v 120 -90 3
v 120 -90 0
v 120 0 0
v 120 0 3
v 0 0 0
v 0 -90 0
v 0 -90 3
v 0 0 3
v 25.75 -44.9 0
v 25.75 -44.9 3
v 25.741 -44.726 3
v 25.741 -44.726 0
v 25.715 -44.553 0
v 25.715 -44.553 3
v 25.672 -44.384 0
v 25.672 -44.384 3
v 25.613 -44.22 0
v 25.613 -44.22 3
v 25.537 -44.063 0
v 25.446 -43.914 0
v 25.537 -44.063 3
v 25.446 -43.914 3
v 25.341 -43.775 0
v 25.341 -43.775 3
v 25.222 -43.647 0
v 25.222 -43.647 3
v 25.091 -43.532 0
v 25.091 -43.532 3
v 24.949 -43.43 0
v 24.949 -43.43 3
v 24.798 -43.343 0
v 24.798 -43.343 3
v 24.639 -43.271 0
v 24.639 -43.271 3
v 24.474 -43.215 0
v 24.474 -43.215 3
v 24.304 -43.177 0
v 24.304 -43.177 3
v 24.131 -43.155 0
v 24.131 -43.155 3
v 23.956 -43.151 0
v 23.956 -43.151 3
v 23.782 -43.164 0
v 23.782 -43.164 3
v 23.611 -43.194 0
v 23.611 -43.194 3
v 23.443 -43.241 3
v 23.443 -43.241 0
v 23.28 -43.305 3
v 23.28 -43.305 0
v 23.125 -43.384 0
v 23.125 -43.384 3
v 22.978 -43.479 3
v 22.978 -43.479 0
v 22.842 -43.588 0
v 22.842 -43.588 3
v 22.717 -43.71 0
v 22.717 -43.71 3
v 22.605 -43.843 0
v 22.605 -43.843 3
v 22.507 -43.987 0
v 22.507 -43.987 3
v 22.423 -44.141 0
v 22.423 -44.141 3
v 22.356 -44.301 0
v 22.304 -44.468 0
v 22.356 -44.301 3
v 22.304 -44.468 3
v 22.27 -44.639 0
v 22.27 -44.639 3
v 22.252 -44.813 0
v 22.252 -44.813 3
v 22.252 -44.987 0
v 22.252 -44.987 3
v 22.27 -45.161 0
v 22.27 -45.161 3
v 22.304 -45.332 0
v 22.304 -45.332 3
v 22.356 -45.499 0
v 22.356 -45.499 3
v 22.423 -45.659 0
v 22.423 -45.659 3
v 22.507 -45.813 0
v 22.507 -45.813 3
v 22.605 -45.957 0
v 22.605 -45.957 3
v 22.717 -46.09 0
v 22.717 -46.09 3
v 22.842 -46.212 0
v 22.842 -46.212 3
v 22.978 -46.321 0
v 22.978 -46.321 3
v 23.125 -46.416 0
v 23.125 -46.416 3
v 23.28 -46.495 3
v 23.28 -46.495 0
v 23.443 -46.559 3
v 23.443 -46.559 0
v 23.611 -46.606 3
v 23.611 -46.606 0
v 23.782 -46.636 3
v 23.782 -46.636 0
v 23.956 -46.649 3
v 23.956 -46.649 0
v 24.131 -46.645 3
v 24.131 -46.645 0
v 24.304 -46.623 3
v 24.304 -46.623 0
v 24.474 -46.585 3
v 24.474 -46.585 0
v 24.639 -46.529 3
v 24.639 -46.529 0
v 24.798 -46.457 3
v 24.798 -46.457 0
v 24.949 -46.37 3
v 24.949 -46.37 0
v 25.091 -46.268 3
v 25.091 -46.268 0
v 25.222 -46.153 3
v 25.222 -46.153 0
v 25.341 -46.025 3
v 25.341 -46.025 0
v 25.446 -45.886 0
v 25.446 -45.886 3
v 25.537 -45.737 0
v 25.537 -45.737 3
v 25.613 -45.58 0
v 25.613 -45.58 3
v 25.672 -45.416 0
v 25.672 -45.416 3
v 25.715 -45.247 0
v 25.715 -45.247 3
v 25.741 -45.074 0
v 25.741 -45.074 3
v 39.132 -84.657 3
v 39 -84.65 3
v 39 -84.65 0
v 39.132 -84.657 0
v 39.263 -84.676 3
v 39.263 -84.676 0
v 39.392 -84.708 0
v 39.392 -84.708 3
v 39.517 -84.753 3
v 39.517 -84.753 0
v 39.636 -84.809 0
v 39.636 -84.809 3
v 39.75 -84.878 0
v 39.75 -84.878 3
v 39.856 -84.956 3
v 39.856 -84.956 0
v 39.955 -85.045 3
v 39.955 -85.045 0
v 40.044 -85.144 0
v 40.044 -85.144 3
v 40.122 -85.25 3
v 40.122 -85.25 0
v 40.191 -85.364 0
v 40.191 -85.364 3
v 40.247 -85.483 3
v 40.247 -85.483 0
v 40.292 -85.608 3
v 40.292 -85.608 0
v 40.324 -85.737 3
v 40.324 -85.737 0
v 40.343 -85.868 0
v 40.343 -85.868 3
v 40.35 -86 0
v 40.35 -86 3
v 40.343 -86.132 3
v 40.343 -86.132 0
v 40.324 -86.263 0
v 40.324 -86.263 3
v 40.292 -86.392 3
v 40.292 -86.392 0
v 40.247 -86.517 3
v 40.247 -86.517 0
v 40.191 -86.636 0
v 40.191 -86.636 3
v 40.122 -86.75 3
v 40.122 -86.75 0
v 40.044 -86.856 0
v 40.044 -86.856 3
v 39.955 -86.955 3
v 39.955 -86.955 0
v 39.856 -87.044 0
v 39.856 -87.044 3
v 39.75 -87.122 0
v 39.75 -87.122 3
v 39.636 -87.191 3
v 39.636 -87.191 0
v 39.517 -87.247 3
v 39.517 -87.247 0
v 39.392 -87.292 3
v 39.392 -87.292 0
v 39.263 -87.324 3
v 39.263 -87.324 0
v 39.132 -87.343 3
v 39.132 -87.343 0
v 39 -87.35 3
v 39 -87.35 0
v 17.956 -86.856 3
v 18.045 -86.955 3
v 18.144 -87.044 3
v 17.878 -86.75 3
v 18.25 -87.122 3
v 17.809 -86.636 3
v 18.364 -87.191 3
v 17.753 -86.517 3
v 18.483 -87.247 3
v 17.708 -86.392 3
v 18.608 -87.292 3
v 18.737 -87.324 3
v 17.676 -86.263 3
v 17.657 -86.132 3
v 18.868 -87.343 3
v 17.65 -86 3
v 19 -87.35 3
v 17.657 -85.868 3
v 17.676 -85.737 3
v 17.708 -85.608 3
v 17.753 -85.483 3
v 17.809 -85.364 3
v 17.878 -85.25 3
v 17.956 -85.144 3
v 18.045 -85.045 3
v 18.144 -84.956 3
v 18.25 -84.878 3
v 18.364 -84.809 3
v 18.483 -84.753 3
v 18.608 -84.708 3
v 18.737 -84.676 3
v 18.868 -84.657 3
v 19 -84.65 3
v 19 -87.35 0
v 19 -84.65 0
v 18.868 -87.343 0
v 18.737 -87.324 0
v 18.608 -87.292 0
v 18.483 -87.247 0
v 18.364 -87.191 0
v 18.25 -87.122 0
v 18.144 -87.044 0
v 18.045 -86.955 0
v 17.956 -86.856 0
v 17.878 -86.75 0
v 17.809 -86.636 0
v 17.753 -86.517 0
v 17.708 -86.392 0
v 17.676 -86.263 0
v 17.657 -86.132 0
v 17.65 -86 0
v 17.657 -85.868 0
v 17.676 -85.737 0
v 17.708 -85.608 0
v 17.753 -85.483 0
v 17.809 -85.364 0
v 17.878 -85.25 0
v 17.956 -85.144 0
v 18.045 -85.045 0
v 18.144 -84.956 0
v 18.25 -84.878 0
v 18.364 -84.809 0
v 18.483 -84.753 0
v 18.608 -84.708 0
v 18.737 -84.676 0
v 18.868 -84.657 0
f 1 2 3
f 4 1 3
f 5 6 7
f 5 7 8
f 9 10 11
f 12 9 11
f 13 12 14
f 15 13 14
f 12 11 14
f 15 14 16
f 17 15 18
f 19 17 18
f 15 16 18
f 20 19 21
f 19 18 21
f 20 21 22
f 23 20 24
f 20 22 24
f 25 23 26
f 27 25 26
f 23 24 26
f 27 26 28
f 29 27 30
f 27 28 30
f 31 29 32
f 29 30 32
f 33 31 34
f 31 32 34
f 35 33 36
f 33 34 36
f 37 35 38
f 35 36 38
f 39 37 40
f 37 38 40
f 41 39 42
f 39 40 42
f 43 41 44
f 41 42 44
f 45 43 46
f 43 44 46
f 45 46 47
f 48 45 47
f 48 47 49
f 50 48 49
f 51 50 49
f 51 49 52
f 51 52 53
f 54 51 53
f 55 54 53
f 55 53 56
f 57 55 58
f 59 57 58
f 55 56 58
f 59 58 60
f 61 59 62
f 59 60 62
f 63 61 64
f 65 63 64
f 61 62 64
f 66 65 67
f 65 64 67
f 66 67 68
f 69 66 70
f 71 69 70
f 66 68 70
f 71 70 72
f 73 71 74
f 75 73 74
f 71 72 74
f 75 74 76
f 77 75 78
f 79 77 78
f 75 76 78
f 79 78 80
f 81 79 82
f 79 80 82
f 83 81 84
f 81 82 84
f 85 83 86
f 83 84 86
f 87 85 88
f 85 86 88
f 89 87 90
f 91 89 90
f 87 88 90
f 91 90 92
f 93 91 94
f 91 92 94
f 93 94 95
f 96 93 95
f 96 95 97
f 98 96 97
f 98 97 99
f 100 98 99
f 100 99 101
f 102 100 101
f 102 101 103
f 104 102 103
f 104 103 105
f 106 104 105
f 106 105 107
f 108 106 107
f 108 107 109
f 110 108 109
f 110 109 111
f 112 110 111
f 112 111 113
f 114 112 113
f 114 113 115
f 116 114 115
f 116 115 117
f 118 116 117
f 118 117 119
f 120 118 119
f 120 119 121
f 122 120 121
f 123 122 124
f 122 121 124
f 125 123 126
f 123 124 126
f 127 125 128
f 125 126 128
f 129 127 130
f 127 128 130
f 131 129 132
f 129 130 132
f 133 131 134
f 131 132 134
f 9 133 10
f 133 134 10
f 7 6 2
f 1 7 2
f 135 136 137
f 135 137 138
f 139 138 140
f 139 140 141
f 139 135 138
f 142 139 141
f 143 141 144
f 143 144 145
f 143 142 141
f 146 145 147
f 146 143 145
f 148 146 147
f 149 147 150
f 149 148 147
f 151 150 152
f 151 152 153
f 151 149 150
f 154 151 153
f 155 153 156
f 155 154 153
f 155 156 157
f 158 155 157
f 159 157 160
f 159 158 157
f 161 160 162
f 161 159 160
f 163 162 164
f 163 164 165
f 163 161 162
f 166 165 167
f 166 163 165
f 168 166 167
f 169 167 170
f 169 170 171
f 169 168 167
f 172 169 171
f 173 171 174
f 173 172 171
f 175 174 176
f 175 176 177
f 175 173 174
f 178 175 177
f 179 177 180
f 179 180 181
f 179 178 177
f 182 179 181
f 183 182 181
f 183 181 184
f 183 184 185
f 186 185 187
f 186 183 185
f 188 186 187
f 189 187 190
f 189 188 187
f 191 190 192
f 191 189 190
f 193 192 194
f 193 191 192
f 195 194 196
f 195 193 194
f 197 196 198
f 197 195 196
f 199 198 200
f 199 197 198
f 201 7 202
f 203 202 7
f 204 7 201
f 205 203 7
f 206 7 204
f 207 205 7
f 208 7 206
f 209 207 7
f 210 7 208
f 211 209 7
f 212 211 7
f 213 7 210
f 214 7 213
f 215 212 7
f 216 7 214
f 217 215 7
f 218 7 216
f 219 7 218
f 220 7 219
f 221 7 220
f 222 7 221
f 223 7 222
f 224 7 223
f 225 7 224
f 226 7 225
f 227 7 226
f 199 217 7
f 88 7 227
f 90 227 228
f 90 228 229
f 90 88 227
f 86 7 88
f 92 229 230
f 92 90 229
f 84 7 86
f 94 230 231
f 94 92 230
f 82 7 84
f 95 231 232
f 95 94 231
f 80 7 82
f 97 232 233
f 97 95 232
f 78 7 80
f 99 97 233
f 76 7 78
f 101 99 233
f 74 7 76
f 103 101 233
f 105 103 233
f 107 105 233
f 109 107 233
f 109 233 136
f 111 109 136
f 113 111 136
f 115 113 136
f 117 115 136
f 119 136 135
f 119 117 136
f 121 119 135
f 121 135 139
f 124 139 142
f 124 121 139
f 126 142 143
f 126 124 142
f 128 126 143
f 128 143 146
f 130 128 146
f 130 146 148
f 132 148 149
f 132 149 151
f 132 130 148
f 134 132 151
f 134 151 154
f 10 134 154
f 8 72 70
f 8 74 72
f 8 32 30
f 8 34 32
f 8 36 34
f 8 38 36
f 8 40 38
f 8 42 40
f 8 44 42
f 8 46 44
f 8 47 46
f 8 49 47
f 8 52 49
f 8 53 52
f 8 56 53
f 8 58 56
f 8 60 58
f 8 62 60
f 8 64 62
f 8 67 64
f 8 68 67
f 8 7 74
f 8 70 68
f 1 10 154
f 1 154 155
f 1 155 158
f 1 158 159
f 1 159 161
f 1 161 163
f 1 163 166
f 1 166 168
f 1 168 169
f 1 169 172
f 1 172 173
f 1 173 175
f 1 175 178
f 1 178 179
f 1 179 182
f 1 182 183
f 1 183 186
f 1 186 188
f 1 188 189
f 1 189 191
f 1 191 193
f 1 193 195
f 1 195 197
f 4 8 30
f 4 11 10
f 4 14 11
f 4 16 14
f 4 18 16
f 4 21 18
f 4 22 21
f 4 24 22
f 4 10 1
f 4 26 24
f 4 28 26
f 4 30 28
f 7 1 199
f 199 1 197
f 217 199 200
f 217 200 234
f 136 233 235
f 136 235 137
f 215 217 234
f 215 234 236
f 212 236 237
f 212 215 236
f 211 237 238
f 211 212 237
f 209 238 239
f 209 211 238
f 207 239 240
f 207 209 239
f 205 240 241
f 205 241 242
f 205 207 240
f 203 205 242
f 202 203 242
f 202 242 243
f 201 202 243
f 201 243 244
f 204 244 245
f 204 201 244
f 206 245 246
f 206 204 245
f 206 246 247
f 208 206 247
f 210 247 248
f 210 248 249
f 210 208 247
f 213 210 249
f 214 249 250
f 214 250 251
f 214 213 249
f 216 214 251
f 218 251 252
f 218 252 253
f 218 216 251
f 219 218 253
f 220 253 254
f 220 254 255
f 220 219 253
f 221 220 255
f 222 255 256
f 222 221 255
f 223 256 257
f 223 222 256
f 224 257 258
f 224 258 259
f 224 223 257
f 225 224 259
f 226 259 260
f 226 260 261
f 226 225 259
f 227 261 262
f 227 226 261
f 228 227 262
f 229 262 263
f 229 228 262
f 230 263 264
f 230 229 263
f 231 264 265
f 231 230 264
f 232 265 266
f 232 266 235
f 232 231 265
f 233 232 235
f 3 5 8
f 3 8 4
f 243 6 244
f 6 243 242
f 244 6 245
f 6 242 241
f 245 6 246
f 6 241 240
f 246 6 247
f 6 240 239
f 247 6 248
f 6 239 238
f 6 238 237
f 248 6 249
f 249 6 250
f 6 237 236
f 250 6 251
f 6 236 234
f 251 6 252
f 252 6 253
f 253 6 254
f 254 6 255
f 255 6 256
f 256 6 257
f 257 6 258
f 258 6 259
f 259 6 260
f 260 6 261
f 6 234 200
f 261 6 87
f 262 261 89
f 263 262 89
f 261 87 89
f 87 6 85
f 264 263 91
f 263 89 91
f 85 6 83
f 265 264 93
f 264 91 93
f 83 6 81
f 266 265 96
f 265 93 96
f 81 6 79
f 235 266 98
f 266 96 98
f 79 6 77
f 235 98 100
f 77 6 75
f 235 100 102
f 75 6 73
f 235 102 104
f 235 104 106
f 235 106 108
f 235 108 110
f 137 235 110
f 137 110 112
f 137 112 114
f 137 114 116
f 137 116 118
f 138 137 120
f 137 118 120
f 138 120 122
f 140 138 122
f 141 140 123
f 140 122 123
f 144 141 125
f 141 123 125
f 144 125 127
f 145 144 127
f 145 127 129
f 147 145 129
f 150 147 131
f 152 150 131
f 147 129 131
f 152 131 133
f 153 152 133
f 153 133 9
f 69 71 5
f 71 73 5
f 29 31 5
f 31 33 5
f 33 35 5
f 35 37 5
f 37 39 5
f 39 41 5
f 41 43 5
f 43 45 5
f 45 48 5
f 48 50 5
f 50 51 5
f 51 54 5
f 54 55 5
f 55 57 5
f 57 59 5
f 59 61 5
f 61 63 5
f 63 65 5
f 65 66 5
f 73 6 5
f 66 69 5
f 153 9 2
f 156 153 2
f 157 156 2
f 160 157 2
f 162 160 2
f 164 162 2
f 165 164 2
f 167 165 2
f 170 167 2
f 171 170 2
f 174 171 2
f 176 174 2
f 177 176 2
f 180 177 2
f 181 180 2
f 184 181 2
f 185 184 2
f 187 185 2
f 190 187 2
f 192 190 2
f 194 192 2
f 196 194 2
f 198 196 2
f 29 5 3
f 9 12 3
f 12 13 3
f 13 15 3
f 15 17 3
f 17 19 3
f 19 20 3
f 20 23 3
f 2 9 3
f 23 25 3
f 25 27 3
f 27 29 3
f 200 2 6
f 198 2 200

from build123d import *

# Parameters (mm, degrees)
SKETCH1_W           = 120
SKETCH1_H           = 90
BOSS_EXTRUDE1_DEPTH = 3
SKETCH2_R           = 1.75
CUT_EXTRUDE1_DEPTH  = 3
CUT_EXTRUDE2_DEPTH  = 3


with BuildPart() as part:
    # Sketch1 → Boss-Extrude1 (new body)
    with BuildSketch(Plane.XY):
        with Locations((60, -45)):
            Rectangle(SKETCH1_W, SKETCH1_H)
    extrude(amount=BOSS_EXTRUDE1_DEPTH)

    # Sketch2 → Cut-Extrude1 (cut)
    with BuildSketch(Plane.XY.offset(3)):
        with Locations((24, -44.9)):
            Circle(SKETCH2_R)
    extrude(amount=-CUT_EXTRUDE1_DEPTH, mode=Mode.SUBTRACT)

    # Sketch3 → Cut-Extrude2 (cut)
    with BuildSketch(Plane.XY.offset(3)):
        with BuildLine():
            Line((19, -84.65), (39, -84.65))
            ThreePointArc((39, -84.65), (40.35, -86), (39, -87.35))
            Line((39, -87.35), (19, -87.35))
            ThreePointArc((19, -87.35), (17.65, -86), (19, -84.65))
        make_face()
    extrude(amount=-CUT_EXTRUDE2_DEPTH, mode=Mode.SUBTRACT)


solid = part.part
